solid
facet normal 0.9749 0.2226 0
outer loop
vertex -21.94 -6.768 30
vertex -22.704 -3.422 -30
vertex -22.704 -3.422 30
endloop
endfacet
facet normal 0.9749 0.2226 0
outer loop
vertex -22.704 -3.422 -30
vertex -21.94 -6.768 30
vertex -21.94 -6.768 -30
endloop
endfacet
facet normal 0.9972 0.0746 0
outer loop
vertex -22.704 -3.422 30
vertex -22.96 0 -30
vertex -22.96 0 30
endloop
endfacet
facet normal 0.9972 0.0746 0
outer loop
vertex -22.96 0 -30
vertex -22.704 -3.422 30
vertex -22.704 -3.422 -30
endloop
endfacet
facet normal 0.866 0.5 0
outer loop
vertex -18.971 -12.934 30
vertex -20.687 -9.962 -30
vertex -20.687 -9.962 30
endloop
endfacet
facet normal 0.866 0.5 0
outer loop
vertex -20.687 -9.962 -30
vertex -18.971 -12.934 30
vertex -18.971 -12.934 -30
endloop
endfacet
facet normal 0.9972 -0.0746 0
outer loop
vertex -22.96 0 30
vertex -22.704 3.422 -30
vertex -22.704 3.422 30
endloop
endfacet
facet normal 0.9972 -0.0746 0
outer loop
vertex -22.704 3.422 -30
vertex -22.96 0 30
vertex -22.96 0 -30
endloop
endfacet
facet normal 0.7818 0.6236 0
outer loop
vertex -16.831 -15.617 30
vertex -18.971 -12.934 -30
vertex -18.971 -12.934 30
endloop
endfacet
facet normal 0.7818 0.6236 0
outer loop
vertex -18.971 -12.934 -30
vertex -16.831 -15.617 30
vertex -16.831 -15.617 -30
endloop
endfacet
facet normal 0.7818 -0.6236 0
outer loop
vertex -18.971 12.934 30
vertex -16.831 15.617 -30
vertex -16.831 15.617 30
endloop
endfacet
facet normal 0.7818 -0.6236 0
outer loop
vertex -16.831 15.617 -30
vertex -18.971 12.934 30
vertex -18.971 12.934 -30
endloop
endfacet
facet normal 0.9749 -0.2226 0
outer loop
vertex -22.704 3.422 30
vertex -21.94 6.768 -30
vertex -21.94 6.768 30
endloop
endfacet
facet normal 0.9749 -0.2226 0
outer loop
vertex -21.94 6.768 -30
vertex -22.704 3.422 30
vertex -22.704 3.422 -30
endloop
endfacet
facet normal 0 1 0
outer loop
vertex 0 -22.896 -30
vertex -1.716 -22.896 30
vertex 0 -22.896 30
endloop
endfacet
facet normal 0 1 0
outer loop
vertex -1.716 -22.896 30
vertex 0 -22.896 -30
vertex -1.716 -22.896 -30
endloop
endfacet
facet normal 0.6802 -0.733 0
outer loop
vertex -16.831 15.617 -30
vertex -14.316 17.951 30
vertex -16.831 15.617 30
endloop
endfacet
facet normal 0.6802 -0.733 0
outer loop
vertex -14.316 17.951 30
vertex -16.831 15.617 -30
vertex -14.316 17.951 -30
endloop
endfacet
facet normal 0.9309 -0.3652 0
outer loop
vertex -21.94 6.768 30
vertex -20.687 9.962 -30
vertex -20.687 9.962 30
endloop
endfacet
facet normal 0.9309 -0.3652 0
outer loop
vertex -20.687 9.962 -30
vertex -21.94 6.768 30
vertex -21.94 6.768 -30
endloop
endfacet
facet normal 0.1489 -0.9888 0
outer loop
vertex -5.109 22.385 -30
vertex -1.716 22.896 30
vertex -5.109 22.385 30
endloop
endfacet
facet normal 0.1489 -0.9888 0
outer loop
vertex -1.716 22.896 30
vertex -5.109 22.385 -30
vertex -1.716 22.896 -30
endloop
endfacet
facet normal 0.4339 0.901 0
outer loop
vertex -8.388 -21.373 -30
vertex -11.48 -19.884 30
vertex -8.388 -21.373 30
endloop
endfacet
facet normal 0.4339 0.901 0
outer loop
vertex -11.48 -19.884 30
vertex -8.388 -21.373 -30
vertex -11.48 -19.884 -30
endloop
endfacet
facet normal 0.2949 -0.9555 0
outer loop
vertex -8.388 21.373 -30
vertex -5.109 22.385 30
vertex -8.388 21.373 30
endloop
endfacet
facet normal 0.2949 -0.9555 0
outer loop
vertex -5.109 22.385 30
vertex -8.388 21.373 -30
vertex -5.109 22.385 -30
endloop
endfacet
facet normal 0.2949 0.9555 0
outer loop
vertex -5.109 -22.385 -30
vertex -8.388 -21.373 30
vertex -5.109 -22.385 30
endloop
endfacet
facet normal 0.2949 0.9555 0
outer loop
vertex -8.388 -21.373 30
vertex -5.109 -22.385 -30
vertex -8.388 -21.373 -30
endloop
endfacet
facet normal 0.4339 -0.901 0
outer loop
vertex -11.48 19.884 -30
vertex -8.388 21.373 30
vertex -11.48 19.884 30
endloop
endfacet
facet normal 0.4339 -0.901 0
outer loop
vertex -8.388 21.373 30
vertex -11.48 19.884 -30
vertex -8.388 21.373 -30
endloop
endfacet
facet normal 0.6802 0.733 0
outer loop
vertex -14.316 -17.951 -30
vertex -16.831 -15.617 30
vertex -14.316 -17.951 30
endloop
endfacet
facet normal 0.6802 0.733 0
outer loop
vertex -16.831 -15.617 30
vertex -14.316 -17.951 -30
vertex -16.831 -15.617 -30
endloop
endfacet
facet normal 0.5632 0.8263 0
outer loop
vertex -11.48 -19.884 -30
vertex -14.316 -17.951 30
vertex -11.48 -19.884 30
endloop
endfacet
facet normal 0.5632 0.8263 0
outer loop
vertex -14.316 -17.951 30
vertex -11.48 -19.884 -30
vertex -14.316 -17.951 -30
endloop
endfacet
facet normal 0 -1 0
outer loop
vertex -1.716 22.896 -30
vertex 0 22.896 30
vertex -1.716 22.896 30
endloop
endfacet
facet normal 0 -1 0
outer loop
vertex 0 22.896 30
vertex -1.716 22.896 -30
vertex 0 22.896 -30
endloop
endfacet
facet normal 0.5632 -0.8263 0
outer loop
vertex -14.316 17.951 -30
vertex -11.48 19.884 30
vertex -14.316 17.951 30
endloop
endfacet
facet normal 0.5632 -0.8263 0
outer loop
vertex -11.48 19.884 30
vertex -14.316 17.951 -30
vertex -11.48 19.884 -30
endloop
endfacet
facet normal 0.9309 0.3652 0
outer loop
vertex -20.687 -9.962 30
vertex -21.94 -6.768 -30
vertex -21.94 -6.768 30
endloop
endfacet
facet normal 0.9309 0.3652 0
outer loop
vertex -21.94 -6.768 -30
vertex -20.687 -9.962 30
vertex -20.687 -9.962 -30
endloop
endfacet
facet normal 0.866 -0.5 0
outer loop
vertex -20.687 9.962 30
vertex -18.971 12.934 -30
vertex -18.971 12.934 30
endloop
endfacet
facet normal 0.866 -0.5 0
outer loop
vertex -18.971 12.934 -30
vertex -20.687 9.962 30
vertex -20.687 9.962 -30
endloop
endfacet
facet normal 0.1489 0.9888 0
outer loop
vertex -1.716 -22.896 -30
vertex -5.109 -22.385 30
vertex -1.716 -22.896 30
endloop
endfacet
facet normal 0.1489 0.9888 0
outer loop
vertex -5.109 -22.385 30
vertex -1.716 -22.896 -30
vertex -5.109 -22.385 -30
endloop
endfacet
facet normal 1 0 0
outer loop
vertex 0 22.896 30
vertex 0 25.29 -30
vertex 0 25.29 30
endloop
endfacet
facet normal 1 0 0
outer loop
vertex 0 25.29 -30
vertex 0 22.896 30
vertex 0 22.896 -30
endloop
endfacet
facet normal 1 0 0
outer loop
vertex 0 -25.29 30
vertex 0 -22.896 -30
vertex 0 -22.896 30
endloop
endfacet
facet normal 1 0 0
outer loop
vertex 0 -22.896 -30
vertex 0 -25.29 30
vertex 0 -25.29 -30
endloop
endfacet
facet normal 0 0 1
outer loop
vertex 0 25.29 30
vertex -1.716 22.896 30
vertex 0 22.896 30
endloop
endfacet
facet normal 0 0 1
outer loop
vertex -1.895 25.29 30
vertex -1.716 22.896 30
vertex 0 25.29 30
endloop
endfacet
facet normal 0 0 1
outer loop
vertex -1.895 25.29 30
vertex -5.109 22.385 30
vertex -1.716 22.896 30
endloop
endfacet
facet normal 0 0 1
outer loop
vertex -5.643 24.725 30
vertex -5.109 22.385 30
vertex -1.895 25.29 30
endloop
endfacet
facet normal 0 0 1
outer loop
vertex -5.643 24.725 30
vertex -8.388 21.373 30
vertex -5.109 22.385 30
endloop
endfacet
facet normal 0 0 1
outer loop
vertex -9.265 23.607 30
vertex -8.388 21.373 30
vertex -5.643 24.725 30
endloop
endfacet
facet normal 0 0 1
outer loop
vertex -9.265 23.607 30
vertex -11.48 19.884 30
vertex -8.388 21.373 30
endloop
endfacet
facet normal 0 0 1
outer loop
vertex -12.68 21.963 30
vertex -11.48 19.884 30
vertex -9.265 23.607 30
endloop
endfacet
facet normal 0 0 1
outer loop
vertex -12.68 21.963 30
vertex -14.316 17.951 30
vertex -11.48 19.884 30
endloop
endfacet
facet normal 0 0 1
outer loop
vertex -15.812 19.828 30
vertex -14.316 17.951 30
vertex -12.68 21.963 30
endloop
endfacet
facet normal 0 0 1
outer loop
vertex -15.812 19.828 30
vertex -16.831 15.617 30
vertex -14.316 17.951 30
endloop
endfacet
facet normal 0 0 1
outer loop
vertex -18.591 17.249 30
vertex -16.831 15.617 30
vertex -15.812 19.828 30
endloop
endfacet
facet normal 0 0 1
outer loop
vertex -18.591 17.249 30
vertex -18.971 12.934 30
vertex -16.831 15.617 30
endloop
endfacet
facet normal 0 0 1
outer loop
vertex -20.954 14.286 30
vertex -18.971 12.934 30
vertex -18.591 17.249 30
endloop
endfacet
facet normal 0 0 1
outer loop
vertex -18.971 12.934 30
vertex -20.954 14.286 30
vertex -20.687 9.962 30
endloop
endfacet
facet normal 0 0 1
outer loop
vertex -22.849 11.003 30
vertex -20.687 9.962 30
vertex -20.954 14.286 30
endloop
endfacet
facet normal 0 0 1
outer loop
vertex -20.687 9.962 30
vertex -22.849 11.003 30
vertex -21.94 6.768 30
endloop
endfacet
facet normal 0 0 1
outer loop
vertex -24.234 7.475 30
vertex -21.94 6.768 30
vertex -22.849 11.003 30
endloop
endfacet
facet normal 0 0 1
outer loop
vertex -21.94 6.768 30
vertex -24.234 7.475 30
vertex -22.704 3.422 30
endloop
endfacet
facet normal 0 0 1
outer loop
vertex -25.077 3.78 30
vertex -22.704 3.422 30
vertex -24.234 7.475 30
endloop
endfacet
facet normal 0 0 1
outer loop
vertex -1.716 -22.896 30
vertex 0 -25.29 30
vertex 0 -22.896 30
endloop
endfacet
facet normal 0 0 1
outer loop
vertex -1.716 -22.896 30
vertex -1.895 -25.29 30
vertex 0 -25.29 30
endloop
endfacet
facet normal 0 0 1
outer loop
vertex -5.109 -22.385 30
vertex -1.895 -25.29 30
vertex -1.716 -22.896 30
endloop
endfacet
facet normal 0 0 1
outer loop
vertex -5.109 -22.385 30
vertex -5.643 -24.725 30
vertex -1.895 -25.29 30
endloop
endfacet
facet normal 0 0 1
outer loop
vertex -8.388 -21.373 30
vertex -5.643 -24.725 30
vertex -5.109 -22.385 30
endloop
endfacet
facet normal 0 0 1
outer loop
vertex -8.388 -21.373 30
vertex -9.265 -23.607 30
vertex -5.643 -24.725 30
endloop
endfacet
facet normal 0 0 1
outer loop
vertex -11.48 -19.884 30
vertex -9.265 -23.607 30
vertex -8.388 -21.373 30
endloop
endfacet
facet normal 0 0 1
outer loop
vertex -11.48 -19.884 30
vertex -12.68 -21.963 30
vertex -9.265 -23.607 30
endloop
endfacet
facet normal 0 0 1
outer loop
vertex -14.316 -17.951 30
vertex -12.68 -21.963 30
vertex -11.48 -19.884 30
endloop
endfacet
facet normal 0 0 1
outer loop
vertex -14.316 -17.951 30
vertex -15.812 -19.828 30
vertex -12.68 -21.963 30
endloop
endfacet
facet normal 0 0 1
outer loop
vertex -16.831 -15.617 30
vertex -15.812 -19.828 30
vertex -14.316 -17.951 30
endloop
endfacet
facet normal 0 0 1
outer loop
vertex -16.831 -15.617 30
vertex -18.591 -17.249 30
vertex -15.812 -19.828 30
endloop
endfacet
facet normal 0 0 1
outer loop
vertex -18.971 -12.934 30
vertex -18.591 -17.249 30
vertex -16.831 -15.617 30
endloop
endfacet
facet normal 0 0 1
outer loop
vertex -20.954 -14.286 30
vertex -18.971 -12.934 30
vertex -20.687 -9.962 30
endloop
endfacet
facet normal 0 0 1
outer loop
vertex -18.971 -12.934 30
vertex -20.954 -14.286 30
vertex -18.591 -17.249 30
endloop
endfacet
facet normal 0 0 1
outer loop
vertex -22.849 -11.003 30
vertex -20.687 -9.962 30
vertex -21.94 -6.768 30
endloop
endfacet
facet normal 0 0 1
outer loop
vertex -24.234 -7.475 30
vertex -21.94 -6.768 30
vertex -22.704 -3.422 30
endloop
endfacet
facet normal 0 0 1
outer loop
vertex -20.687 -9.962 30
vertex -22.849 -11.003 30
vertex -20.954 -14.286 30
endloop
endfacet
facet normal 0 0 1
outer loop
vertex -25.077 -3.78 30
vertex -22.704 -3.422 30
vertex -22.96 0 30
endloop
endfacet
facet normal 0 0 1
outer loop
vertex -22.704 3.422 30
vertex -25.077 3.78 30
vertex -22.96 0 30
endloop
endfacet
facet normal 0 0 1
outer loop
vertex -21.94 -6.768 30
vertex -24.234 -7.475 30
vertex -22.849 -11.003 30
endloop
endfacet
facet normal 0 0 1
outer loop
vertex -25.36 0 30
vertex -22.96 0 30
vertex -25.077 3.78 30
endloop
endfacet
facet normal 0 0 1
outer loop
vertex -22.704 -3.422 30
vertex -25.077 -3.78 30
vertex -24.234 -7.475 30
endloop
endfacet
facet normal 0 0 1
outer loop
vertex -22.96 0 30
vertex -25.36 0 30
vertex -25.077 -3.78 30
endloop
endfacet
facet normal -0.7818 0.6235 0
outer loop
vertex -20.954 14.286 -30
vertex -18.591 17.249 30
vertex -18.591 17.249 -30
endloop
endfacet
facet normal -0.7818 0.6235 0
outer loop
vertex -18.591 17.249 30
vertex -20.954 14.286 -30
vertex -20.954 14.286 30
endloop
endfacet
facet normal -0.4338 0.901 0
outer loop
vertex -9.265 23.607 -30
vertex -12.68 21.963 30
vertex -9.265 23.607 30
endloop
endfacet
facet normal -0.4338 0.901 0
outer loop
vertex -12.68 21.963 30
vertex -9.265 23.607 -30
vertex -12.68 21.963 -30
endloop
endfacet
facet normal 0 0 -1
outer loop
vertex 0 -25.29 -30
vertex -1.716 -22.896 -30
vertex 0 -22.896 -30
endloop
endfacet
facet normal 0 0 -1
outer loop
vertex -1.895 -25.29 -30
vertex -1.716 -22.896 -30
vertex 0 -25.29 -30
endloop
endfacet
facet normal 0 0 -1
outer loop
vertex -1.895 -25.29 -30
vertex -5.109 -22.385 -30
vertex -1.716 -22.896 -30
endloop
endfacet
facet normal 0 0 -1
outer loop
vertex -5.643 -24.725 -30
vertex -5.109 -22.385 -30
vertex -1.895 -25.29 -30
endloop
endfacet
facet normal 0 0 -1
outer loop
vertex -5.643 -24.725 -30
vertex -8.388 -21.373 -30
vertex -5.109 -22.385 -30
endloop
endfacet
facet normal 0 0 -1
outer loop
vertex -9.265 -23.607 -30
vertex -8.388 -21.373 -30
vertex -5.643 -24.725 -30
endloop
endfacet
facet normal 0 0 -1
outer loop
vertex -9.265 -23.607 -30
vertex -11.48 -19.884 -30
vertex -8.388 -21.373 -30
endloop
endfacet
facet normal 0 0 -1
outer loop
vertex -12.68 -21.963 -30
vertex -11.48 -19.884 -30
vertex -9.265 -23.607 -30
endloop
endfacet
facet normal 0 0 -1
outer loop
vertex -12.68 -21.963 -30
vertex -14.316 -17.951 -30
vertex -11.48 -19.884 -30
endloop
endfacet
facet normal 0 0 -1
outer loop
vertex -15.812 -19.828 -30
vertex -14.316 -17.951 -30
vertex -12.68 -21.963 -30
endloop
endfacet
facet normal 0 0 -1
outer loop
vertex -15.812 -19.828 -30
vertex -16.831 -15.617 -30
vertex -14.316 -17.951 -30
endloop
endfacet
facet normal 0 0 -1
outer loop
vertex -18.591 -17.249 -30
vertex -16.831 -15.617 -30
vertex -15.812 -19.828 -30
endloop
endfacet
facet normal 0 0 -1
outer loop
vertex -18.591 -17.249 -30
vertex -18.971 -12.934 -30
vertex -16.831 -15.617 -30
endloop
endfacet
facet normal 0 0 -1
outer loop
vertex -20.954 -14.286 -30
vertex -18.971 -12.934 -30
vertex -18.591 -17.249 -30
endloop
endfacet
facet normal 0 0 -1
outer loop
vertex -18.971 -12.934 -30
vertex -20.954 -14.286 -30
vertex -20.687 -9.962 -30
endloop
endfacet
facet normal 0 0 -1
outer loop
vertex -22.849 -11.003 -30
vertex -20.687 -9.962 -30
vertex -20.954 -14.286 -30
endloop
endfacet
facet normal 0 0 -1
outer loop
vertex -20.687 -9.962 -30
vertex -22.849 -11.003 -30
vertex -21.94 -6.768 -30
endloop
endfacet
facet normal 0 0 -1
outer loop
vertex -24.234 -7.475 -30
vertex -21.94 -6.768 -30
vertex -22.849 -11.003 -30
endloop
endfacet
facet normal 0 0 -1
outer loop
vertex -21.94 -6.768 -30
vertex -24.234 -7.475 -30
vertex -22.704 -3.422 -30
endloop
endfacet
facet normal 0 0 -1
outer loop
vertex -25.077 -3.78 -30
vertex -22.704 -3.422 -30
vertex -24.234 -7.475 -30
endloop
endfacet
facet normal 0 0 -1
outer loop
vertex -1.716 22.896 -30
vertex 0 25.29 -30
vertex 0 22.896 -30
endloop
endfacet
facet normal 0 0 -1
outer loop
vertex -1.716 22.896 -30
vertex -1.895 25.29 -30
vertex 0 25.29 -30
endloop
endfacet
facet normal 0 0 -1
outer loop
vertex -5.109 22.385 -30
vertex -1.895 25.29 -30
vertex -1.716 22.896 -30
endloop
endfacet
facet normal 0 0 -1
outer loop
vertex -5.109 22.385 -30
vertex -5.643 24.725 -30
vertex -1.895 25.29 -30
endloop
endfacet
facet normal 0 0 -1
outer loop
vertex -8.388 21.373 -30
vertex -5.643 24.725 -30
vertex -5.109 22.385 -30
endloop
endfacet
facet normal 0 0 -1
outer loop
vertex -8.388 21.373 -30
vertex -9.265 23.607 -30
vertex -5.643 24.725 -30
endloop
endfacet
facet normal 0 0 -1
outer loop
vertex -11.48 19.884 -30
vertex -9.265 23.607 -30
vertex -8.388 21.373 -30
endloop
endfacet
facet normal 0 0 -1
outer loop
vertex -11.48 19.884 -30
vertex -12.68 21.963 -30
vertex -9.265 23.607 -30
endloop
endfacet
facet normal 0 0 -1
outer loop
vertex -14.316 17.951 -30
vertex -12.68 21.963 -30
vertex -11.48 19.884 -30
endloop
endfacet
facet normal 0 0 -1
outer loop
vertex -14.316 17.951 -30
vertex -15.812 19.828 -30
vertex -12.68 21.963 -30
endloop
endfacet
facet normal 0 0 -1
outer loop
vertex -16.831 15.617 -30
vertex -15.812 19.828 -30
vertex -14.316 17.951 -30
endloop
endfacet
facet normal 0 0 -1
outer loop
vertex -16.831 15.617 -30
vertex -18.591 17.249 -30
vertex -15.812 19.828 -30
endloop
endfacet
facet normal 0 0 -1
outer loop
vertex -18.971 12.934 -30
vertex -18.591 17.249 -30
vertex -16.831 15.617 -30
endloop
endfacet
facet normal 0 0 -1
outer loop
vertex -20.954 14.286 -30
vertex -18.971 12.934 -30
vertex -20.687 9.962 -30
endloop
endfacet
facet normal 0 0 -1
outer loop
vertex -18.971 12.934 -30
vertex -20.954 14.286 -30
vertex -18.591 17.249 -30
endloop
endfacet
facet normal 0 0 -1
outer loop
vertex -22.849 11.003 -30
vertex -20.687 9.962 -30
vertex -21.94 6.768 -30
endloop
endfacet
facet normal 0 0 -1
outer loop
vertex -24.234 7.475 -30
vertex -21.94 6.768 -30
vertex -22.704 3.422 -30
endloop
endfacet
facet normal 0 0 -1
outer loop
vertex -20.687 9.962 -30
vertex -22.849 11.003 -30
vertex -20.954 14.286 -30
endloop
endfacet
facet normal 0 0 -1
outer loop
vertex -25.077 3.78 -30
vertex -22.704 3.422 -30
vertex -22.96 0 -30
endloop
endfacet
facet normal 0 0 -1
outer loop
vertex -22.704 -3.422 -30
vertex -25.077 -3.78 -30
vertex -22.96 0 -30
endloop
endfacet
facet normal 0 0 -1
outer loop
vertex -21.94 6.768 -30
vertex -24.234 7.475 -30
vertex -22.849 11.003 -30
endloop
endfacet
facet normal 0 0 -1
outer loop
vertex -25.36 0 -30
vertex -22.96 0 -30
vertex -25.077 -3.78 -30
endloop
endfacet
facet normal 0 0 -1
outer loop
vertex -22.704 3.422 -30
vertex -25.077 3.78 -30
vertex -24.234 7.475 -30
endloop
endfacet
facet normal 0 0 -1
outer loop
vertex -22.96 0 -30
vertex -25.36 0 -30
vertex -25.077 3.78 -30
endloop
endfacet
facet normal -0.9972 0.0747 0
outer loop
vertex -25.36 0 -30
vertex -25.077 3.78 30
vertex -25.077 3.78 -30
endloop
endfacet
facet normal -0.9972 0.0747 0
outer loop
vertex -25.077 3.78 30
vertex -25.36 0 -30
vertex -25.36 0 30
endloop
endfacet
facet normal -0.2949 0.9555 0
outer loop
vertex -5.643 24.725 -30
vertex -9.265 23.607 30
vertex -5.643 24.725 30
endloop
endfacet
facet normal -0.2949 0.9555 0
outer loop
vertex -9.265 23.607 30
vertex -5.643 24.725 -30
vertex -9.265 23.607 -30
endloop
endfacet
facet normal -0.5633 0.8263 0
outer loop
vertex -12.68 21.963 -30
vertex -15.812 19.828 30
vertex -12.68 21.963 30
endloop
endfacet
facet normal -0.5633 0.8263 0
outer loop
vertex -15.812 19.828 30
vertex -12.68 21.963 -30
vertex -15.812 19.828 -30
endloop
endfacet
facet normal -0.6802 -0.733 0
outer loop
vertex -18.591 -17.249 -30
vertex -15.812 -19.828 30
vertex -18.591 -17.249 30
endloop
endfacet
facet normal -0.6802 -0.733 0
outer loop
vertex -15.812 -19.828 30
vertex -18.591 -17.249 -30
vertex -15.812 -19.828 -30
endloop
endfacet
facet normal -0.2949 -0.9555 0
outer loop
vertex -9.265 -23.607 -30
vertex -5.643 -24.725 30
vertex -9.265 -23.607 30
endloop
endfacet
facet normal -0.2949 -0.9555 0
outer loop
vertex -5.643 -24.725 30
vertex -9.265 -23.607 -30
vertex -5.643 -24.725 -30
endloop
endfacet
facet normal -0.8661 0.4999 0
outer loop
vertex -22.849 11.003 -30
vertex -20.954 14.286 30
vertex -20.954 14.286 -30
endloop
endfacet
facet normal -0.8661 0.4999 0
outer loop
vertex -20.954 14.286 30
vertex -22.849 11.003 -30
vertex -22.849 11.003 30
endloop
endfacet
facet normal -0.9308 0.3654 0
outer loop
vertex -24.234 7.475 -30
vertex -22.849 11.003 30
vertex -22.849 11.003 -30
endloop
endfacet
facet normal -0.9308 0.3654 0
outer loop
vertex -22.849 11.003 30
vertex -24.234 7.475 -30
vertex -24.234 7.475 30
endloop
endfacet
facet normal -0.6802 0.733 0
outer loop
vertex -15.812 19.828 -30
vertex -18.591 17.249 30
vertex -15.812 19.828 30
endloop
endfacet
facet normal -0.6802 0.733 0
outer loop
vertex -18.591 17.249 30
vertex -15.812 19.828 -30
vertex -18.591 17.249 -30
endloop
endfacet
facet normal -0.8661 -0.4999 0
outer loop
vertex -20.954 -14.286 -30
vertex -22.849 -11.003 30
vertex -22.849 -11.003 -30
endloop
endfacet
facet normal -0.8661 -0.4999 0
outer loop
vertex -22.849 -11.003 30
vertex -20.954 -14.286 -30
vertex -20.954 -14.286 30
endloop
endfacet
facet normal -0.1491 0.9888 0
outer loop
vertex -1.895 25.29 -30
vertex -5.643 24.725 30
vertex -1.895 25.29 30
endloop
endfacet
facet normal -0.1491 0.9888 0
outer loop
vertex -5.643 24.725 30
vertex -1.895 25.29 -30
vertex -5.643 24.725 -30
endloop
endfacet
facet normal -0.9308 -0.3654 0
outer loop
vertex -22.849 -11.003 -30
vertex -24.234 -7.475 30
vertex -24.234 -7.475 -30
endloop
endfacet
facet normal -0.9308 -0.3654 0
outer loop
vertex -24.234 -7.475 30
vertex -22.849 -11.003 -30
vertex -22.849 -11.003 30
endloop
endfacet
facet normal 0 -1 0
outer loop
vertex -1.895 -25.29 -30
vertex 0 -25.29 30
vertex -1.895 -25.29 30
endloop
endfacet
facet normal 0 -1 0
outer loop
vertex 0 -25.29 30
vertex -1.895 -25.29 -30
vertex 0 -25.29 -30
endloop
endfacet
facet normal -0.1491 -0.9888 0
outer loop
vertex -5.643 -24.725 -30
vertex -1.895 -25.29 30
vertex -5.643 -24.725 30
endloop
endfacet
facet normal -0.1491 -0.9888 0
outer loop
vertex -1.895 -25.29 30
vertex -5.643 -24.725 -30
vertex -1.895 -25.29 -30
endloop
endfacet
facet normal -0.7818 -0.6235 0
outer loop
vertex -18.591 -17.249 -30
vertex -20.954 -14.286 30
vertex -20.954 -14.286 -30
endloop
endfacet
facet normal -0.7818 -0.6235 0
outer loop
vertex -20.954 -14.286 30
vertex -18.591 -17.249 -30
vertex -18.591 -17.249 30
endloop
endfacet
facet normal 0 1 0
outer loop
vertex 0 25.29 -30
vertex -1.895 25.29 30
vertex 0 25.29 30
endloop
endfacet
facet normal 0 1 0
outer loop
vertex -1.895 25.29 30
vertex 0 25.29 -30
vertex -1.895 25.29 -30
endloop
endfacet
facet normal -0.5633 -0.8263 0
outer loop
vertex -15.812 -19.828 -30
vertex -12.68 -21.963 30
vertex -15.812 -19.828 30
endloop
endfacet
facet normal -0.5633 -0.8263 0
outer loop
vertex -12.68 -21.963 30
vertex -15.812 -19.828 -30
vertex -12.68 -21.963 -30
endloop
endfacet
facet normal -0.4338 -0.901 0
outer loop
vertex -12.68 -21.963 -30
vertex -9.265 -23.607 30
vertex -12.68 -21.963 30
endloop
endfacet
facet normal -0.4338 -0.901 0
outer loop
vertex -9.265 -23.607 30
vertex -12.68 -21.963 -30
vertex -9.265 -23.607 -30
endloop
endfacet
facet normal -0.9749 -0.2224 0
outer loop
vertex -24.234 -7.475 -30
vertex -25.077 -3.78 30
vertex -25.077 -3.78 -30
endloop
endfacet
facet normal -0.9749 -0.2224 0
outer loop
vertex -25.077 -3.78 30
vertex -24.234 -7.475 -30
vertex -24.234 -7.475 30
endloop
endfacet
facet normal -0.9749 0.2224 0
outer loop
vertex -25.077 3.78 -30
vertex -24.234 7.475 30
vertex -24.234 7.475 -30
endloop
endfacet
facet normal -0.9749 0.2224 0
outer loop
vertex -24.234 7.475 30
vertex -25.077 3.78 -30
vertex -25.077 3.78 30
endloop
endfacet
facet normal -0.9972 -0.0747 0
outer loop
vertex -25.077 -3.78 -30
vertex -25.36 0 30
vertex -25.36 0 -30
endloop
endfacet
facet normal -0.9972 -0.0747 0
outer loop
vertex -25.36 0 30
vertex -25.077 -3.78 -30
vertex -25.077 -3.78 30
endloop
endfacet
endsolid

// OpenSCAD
// preview[view:west, tilt:top]

// Desired height of cylinder. Image will scaled to fit in the height, with the radius set so that the width takes up one half of it.
cylinder_height = 60;

// Desired thickness of embossed region.
image_thickness = 2;

// Select "outside" to get the image on the outside of the cylinder.
direction = "inside"; // [inside, outside]

// Use http://customizer.makerbot.com/image_surface?image_x=81&image_y=61 to generate.
// Check invert colors if printing on the inside. Leave uninverted for the outside.
surface_file = "surface.dat"; // [image_surface:81x61]

// Select "light" if your (uninverted) image has a light background.
background = "dark"; // [dark, light]

// Need to leave one extrusion width all the way around so there will be no holes.
extrusion_width = 0.4;

// More gives higher resolution cylinder, but takes longer and may crash OpenSCAD. Use an odd number.
n_facets = 21;

/* [Hidden] */
// Change these if you are providing a larger than default surface file.
image_width = 81;
image_height = 61;

slop = 0.1;
surface_width = cylinder_height / image_height * image_width;
cylinder_r = surface_width / PI;
step_distance = surface_width / n_facets;
step_degree = 180 / n_facets;
$fn = n_facets * 2;

module emboss(step = 0) {
  difference() {
    if (step < n_facets) rotate([0, 0, -step_degree]) emboss(step + 1) child();
    else child();

    image_surface(step * step_distance);
  }
}

// We want the non-image side to meld into the image, so for dark backgrounds
// we cut in full black, and for light backgrounds cut in full white.
module backside_cutter() {
  difference() {
    cylinder(h=cylinder_height + 4*slop, r=cylinder_r + slop, center=true);

    if (background == "dark" && direction == "inside" || background == "light" && direction == "outside") cylinder(h=cylinder_height + 6*slop, r=cylinder_r - image_thickness - extrusion_width, center=true);
    else cylinder(h=cylinder_height + 6*slop, r=cylinder_r - extrusion_width, center=true);

    translate([-cylinder_r - 2*slop, -cylinder_r - 2*slop, -cylinder_height/2 - 3*slop])
    cube([cylinder_r + 2*slop, 2 * (cylinder_r + 2*slop), cylinder_height + 6*slop]);
  }
}

module blank() {
  difference() {
    cylinder(h=cylinder_height + 2*slop, r=cylinder_r, center=true);
    backside_cutter();
  }
}

module scaled_surface() {
  rotate([90, 0, 0])
  // Translate inward by extrusion width so there can be no holes for pure white.
  translate([0, 0, extrusion_width])
  scale([surface_width/(image_width - 1), (cylinder_height + 2*slop)/(image_height - 1), image_thickness])
  translate([image_width - 1, 0, 0])
  mirror([1, 0, 0])
  surface(file=surface_file, convexity = 5);
}

module image_surface(x) {
  translate([-x, cylinder_r * cos(step_degree/2), -cylinder_height/2 - slop]) scaled_surface();
}

if (direction == "outside") {
  intersection() {
    difference() {
      emboss() blank();
      cylinder(h=cylinder_height + 2*slop, r=cylinder_r - image_thickness - 2*extrusion_width, center=true);
    }
    cube([2*(cylinder_r + slop), 2*(cylinder_r + slop), cylinder_height], center=true);
  }
}
else {
  difference() {
    cylinder(h=cylinder_height, r=cylinder_r, center=true);
    emboss() blank();
  }
}
